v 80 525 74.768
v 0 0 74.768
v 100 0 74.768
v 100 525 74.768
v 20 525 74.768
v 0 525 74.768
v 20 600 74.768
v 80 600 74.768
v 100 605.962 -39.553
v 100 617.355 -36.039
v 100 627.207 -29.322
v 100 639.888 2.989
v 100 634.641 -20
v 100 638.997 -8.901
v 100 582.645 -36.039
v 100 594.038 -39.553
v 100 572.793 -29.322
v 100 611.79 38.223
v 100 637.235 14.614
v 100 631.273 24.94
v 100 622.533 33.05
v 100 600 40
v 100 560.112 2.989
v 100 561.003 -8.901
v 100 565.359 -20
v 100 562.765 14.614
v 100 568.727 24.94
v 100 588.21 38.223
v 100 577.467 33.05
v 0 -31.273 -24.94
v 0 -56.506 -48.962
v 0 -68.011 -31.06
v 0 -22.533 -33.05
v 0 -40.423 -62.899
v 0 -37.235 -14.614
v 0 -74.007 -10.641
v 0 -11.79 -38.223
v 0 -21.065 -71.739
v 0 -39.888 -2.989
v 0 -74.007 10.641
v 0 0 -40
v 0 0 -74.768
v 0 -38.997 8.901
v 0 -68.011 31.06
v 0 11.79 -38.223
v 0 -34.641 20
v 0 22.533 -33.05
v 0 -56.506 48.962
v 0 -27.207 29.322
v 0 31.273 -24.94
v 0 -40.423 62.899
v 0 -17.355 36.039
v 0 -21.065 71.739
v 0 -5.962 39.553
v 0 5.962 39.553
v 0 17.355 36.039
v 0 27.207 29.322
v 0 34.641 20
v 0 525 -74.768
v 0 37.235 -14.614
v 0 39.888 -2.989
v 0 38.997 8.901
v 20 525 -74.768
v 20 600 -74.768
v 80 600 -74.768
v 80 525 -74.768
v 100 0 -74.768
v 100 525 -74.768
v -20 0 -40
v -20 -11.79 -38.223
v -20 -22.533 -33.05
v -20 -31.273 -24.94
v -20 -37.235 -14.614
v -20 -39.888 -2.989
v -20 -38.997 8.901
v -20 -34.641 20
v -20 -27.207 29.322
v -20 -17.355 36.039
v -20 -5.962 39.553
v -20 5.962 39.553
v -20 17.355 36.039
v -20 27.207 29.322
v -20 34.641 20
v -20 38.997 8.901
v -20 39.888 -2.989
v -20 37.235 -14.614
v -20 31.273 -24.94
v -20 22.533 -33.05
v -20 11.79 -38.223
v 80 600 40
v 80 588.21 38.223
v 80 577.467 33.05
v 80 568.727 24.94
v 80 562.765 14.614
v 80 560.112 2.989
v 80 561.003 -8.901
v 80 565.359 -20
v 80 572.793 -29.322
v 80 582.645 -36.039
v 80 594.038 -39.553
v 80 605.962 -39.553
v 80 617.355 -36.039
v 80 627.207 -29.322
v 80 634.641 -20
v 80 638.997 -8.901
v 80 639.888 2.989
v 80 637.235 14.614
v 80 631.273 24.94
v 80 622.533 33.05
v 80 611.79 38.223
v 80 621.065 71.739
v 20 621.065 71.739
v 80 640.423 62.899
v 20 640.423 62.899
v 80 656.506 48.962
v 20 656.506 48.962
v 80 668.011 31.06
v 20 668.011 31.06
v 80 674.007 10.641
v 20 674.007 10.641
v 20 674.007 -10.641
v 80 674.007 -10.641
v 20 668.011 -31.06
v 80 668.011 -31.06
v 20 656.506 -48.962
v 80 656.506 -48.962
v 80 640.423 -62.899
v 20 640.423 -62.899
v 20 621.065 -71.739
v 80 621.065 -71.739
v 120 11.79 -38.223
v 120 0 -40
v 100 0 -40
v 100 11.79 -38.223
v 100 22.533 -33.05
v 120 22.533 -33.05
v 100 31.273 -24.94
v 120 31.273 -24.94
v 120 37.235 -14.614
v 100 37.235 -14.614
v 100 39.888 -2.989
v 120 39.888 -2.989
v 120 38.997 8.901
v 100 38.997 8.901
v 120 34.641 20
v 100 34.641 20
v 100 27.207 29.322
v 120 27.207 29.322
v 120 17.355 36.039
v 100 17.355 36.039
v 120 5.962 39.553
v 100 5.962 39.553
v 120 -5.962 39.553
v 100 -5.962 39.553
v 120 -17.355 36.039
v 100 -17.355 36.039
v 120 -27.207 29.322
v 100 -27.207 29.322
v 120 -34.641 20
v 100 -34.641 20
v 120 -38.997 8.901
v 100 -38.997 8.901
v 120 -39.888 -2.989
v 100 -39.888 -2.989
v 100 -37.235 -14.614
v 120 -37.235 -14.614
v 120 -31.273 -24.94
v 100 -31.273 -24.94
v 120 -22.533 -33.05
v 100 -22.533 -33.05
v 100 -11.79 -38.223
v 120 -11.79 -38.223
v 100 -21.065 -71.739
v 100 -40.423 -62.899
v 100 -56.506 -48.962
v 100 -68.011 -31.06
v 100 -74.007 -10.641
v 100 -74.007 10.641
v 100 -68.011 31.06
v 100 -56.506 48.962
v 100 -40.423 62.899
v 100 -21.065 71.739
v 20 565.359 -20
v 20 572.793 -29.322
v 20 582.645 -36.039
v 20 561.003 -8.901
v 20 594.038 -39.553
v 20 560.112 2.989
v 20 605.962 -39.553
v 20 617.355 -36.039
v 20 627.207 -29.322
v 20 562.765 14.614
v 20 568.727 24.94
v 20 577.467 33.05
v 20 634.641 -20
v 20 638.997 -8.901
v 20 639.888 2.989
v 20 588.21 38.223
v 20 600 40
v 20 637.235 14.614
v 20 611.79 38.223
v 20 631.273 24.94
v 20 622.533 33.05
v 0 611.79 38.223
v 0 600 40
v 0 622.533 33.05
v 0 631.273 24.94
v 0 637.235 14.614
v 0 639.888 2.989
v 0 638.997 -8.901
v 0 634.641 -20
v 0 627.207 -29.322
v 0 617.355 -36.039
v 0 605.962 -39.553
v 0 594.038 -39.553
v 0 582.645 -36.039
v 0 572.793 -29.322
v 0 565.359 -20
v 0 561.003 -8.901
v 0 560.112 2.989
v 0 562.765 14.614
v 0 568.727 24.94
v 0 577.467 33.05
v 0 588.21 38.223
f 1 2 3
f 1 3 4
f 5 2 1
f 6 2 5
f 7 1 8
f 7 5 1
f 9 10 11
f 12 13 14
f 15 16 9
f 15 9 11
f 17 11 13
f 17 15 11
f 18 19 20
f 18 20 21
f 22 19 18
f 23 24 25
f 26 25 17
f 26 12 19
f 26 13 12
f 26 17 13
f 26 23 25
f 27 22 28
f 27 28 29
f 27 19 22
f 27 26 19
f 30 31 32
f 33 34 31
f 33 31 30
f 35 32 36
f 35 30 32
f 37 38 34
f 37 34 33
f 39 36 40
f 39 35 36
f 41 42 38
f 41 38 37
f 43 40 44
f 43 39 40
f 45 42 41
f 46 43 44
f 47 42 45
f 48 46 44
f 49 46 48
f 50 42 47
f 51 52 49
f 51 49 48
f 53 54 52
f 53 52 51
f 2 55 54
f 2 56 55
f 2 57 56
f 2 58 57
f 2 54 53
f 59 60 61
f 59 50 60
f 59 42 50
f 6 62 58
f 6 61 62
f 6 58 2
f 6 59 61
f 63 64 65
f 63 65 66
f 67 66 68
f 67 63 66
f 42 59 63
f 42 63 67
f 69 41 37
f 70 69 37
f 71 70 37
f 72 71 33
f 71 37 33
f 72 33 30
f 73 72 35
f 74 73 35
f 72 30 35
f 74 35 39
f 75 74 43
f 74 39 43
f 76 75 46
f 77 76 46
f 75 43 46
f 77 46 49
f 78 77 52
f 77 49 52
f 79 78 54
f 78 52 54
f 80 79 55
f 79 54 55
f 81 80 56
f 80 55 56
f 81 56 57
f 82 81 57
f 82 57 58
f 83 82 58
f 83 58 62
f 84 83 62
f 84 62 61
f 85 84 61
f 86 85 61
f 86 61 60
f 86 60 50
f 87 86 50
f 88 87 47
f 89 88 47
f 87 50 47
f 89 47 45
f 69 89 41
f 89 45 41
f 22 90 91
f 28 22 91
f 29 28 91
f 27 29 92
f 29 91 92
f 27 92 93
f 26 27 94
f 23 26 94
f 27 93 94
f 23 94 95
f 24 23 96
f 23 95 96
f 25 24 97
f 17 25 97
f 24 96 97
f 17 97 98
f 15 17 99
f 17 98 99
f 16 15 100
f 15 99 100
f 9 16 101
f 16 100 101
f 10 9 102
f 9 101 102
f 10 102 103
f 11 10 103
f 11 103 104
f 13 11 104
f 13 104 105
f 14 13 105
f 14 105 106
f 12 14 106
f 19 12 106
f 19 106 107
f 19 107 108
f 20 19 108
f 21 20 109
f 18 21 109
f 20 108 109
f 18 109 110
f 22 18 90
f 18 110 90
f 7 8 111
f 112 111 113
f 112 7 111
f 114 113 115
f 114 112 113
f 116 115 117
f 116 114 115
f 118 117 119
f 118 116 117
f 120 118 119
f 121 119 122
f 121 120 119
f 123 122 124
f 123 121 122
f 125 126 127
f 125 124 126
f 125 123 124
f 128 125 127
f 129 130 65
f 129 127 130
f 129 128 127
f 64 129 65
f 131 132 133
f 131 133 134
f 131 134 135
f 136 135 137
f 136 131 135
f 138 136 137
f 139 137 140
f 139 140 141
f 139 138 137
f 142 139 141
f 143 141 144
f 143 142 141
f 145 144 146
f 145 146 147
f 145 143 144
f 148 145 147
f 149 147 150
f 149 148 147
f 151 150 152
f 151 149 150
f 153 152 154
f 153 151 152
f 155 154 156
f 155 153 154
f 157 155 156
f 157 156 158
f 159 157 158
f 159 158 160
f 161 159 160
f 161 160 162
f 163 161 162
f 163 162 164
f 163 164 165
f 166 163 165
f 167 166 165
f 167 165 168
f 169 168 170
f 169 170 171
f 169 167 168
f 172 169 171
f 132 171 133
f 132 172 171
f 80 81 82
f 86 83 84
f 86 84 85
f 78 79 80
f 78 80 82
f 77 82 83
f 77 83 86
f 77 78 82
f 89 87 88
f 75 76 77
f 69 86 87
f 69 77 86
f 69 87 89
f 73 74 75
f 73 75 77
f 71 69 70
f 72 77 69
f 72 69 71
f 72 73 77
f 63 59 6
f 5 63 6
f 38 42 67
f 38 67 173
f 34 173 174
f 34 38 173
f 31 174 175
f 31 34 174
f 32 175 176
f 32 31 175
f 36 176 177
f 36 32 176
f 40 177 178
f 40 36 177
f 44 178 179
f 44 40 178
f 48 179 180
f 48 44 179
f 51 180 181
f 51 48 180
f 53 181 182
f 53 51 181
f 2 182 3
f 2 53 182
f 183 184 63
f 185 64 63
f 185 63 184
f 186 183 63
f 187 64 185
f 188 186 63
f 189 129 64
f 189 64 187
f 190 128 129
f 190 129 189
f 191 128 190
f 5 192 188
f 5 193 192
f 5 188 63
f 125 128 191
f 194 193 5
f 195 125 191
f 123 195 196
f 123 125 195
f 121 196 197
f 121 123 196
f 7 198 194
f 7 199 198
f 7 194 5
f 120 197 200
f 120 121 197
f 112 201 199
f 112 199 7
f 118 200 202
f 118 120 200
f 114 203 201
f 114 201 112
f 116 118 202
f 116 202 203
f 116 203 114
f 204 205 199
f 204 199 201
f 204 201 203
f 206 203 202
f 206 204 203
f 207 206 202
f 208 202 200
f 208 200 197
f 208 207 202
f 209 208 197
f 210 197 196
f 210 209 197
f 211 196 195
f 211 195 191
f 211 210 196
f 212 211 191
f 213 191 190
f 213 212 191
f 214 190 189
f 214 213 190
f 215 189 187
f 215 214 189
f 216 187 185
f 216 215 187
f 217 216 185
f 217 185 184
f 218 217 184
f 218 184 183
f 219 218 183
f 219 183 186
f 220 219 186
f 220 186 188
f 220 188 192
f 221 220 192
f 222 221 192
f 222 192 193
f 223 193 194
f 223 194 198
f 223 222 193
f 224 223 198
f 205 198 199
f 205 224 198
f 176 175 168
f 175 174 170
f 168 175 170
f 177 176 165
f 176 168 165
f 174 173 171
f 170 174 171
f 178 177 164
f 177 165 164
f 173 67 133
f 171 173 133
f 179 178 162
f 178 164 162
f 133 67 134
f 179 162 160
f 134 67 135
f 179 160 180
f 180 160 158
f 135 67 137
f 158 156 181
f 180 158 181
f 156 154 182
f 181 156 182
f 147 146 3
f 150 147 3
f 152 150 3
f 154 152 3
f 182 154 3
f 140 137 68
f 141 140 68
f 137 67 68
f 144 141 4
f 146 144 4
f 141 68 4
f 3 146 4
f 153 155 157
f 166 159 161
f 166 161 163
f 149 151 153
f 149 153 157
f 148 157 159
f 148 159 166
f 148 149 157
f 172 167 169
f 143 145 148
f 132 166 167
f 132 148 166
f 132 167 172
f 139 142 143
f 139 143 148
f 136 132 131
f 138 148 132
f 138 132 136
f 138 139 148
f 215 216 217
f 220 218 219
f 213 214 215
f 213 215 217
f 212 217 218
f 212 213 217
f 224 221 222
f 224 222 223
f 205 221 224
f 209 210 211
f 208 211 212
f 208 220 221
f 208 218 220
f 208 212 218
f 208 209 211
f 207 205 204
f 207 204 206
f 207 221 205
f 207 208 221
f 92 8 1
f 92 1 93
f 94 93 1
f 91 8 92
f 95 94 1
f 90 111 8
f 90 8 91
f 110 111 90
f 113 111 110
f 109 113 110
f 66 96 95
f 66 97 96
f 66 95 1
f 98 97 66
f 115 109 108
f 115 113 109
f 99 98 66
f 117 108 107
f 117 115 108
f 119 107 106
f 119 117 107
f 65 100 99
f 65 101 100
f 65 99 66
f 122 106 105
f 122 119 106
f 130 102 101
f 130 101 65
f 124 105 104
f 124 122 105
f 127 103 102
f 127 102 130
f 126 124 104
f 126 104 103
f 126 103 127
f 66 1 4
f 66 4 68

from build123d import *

# Parameters (mm, degrees)
BOSS_EXTRUDE1_DEPTH = 100
CUT_EXTRUDE2_DEPTH  = 20
CUT_EXTRUDE3_START  = -20
CUT_EXTRUDE3_DEPTH  = 20
SKETCH9_R           = 40
BOSS_EXTRUDE2_DEPTH = 20
BOSS_EXTRUDE3_START = 20
SKETCH2_R           = 40
BOSS_EXTRUDE3_DEPTH = 20
SKETCH10_R          = 40
BOSS_EXTRUDE6_DEPTH = 20
BOSS_EXTRUDE7_START = 20
SKETCH11_R          = 40
BOSS_EXTRUDE7_DEPTH = 20


with BuildPart() as part:
    # Sketch1 → Boss-Extrude1 (new body)
    with BuildSketch(Plane(origin=(0, 0, 0), x_dir=(0, 0, -1), z_dir=(1, 0, 0))):
        with BuildLine():
            Line((-74.767803634, 0), (-74.767803634, 600))
            ThreePointArc((-74.767803634, 600), (0, 674.767803634), (74.767803634, 600))
            Line((74.767803634, 600), (74.767803634, 0))
            ThreePointArc((74.767803634, 0), (0, -74.767803634), (-74.767803634, 0))
        make_face()
    extrude(amount=BOSS_EXTRUDE1_DEPTH)

    # Sketch8 → Cut-Extrude2 (cut)
    with BuildSketch(Plane.ZY):
        with BuildLine():
            Line((-74.767803634, 600), (-74.767803634, 525))
            Line((-74.767803634, 525), (74.767803634, 525))
            Line((74.767803634, 525), (74.767803634, 600))
            ThreePointArc((74.767803634, 600), (0, 674.767803634), (-74.767803634, 600))
        make_face()
    extrude(amount=-CUT_EXTRUDE2_DEPTH, mode=Mode.SUBTRACT)

    # Sketch7 → Cut-Extrude3 (cut)
    with BuildSketch(Plane(origin=(100, 0, 0), x_dir=(0, 0, -1), z_dir=(1, 0, 0)).offset(CUT_EXTRUDE3_START)):
        with BuildLine():
            Line((-74.767803634, 600), (-74.767803634, 525))
            Line((-74.767803634, 525), (74.767803634, 525))
            Line((74.767803634, 525), (74.767803634, 600))
            ThreePointArc((74.767803634, 600), (0, 674.767803634), (-74.767803634, 600))
        make_face()
    extrude(amount=CUT_EXTRUDE3_DEPTH, mode=Mode.SUBTRACT)

    # Sketch9 → Boss-Extrude2 (add)
    with BuildSketch(Plane.ZY):
        with Locations(Location((0, 0, 0), (0, 0, 180))):
            Circle(SKETCH9_R)
    extrude(amount=BOSS_EXTRUDE2_DEPTH)

    # Sketch2 → Boss-Extrude3 (add)
    with BuildSketch(Plane(origin=(100, 0, 0), x_dir=(0, 0, -1), z_dir=(1, 0, 0)).offset(BOSS_EXTRUDE3_START)):
        Circle(SKETCH2_R)
    extrude(amount=-BOSS_EXTRUDE3_DEPTH)

    # Sketch10 → Boss-Extrude6 (add)
    with BuildSketch(Plane(origin=(80, 0, 0), x_dir=(0, 0, -1), z_dir=(1, 0, 0))):
        with Locations(Location((0, 600, 0), (0, 0, 180))):
            Circle(SKETCH10_R)
    extrude(amount=BOSS_EXTRUDE6_DEPTH)

    # Sketch11 → Boss-Extrude7 (add)
    with BuildSketch(Plane.ZY.offset(-20).offset(BOSS_EXTRUDE7_START)):
        with Locations((0, 600)):
            Circle(SKETCH11_R)
    extrude(amount=-BOSS_EXTRUDE7_DEPTH)


solid = part.part
